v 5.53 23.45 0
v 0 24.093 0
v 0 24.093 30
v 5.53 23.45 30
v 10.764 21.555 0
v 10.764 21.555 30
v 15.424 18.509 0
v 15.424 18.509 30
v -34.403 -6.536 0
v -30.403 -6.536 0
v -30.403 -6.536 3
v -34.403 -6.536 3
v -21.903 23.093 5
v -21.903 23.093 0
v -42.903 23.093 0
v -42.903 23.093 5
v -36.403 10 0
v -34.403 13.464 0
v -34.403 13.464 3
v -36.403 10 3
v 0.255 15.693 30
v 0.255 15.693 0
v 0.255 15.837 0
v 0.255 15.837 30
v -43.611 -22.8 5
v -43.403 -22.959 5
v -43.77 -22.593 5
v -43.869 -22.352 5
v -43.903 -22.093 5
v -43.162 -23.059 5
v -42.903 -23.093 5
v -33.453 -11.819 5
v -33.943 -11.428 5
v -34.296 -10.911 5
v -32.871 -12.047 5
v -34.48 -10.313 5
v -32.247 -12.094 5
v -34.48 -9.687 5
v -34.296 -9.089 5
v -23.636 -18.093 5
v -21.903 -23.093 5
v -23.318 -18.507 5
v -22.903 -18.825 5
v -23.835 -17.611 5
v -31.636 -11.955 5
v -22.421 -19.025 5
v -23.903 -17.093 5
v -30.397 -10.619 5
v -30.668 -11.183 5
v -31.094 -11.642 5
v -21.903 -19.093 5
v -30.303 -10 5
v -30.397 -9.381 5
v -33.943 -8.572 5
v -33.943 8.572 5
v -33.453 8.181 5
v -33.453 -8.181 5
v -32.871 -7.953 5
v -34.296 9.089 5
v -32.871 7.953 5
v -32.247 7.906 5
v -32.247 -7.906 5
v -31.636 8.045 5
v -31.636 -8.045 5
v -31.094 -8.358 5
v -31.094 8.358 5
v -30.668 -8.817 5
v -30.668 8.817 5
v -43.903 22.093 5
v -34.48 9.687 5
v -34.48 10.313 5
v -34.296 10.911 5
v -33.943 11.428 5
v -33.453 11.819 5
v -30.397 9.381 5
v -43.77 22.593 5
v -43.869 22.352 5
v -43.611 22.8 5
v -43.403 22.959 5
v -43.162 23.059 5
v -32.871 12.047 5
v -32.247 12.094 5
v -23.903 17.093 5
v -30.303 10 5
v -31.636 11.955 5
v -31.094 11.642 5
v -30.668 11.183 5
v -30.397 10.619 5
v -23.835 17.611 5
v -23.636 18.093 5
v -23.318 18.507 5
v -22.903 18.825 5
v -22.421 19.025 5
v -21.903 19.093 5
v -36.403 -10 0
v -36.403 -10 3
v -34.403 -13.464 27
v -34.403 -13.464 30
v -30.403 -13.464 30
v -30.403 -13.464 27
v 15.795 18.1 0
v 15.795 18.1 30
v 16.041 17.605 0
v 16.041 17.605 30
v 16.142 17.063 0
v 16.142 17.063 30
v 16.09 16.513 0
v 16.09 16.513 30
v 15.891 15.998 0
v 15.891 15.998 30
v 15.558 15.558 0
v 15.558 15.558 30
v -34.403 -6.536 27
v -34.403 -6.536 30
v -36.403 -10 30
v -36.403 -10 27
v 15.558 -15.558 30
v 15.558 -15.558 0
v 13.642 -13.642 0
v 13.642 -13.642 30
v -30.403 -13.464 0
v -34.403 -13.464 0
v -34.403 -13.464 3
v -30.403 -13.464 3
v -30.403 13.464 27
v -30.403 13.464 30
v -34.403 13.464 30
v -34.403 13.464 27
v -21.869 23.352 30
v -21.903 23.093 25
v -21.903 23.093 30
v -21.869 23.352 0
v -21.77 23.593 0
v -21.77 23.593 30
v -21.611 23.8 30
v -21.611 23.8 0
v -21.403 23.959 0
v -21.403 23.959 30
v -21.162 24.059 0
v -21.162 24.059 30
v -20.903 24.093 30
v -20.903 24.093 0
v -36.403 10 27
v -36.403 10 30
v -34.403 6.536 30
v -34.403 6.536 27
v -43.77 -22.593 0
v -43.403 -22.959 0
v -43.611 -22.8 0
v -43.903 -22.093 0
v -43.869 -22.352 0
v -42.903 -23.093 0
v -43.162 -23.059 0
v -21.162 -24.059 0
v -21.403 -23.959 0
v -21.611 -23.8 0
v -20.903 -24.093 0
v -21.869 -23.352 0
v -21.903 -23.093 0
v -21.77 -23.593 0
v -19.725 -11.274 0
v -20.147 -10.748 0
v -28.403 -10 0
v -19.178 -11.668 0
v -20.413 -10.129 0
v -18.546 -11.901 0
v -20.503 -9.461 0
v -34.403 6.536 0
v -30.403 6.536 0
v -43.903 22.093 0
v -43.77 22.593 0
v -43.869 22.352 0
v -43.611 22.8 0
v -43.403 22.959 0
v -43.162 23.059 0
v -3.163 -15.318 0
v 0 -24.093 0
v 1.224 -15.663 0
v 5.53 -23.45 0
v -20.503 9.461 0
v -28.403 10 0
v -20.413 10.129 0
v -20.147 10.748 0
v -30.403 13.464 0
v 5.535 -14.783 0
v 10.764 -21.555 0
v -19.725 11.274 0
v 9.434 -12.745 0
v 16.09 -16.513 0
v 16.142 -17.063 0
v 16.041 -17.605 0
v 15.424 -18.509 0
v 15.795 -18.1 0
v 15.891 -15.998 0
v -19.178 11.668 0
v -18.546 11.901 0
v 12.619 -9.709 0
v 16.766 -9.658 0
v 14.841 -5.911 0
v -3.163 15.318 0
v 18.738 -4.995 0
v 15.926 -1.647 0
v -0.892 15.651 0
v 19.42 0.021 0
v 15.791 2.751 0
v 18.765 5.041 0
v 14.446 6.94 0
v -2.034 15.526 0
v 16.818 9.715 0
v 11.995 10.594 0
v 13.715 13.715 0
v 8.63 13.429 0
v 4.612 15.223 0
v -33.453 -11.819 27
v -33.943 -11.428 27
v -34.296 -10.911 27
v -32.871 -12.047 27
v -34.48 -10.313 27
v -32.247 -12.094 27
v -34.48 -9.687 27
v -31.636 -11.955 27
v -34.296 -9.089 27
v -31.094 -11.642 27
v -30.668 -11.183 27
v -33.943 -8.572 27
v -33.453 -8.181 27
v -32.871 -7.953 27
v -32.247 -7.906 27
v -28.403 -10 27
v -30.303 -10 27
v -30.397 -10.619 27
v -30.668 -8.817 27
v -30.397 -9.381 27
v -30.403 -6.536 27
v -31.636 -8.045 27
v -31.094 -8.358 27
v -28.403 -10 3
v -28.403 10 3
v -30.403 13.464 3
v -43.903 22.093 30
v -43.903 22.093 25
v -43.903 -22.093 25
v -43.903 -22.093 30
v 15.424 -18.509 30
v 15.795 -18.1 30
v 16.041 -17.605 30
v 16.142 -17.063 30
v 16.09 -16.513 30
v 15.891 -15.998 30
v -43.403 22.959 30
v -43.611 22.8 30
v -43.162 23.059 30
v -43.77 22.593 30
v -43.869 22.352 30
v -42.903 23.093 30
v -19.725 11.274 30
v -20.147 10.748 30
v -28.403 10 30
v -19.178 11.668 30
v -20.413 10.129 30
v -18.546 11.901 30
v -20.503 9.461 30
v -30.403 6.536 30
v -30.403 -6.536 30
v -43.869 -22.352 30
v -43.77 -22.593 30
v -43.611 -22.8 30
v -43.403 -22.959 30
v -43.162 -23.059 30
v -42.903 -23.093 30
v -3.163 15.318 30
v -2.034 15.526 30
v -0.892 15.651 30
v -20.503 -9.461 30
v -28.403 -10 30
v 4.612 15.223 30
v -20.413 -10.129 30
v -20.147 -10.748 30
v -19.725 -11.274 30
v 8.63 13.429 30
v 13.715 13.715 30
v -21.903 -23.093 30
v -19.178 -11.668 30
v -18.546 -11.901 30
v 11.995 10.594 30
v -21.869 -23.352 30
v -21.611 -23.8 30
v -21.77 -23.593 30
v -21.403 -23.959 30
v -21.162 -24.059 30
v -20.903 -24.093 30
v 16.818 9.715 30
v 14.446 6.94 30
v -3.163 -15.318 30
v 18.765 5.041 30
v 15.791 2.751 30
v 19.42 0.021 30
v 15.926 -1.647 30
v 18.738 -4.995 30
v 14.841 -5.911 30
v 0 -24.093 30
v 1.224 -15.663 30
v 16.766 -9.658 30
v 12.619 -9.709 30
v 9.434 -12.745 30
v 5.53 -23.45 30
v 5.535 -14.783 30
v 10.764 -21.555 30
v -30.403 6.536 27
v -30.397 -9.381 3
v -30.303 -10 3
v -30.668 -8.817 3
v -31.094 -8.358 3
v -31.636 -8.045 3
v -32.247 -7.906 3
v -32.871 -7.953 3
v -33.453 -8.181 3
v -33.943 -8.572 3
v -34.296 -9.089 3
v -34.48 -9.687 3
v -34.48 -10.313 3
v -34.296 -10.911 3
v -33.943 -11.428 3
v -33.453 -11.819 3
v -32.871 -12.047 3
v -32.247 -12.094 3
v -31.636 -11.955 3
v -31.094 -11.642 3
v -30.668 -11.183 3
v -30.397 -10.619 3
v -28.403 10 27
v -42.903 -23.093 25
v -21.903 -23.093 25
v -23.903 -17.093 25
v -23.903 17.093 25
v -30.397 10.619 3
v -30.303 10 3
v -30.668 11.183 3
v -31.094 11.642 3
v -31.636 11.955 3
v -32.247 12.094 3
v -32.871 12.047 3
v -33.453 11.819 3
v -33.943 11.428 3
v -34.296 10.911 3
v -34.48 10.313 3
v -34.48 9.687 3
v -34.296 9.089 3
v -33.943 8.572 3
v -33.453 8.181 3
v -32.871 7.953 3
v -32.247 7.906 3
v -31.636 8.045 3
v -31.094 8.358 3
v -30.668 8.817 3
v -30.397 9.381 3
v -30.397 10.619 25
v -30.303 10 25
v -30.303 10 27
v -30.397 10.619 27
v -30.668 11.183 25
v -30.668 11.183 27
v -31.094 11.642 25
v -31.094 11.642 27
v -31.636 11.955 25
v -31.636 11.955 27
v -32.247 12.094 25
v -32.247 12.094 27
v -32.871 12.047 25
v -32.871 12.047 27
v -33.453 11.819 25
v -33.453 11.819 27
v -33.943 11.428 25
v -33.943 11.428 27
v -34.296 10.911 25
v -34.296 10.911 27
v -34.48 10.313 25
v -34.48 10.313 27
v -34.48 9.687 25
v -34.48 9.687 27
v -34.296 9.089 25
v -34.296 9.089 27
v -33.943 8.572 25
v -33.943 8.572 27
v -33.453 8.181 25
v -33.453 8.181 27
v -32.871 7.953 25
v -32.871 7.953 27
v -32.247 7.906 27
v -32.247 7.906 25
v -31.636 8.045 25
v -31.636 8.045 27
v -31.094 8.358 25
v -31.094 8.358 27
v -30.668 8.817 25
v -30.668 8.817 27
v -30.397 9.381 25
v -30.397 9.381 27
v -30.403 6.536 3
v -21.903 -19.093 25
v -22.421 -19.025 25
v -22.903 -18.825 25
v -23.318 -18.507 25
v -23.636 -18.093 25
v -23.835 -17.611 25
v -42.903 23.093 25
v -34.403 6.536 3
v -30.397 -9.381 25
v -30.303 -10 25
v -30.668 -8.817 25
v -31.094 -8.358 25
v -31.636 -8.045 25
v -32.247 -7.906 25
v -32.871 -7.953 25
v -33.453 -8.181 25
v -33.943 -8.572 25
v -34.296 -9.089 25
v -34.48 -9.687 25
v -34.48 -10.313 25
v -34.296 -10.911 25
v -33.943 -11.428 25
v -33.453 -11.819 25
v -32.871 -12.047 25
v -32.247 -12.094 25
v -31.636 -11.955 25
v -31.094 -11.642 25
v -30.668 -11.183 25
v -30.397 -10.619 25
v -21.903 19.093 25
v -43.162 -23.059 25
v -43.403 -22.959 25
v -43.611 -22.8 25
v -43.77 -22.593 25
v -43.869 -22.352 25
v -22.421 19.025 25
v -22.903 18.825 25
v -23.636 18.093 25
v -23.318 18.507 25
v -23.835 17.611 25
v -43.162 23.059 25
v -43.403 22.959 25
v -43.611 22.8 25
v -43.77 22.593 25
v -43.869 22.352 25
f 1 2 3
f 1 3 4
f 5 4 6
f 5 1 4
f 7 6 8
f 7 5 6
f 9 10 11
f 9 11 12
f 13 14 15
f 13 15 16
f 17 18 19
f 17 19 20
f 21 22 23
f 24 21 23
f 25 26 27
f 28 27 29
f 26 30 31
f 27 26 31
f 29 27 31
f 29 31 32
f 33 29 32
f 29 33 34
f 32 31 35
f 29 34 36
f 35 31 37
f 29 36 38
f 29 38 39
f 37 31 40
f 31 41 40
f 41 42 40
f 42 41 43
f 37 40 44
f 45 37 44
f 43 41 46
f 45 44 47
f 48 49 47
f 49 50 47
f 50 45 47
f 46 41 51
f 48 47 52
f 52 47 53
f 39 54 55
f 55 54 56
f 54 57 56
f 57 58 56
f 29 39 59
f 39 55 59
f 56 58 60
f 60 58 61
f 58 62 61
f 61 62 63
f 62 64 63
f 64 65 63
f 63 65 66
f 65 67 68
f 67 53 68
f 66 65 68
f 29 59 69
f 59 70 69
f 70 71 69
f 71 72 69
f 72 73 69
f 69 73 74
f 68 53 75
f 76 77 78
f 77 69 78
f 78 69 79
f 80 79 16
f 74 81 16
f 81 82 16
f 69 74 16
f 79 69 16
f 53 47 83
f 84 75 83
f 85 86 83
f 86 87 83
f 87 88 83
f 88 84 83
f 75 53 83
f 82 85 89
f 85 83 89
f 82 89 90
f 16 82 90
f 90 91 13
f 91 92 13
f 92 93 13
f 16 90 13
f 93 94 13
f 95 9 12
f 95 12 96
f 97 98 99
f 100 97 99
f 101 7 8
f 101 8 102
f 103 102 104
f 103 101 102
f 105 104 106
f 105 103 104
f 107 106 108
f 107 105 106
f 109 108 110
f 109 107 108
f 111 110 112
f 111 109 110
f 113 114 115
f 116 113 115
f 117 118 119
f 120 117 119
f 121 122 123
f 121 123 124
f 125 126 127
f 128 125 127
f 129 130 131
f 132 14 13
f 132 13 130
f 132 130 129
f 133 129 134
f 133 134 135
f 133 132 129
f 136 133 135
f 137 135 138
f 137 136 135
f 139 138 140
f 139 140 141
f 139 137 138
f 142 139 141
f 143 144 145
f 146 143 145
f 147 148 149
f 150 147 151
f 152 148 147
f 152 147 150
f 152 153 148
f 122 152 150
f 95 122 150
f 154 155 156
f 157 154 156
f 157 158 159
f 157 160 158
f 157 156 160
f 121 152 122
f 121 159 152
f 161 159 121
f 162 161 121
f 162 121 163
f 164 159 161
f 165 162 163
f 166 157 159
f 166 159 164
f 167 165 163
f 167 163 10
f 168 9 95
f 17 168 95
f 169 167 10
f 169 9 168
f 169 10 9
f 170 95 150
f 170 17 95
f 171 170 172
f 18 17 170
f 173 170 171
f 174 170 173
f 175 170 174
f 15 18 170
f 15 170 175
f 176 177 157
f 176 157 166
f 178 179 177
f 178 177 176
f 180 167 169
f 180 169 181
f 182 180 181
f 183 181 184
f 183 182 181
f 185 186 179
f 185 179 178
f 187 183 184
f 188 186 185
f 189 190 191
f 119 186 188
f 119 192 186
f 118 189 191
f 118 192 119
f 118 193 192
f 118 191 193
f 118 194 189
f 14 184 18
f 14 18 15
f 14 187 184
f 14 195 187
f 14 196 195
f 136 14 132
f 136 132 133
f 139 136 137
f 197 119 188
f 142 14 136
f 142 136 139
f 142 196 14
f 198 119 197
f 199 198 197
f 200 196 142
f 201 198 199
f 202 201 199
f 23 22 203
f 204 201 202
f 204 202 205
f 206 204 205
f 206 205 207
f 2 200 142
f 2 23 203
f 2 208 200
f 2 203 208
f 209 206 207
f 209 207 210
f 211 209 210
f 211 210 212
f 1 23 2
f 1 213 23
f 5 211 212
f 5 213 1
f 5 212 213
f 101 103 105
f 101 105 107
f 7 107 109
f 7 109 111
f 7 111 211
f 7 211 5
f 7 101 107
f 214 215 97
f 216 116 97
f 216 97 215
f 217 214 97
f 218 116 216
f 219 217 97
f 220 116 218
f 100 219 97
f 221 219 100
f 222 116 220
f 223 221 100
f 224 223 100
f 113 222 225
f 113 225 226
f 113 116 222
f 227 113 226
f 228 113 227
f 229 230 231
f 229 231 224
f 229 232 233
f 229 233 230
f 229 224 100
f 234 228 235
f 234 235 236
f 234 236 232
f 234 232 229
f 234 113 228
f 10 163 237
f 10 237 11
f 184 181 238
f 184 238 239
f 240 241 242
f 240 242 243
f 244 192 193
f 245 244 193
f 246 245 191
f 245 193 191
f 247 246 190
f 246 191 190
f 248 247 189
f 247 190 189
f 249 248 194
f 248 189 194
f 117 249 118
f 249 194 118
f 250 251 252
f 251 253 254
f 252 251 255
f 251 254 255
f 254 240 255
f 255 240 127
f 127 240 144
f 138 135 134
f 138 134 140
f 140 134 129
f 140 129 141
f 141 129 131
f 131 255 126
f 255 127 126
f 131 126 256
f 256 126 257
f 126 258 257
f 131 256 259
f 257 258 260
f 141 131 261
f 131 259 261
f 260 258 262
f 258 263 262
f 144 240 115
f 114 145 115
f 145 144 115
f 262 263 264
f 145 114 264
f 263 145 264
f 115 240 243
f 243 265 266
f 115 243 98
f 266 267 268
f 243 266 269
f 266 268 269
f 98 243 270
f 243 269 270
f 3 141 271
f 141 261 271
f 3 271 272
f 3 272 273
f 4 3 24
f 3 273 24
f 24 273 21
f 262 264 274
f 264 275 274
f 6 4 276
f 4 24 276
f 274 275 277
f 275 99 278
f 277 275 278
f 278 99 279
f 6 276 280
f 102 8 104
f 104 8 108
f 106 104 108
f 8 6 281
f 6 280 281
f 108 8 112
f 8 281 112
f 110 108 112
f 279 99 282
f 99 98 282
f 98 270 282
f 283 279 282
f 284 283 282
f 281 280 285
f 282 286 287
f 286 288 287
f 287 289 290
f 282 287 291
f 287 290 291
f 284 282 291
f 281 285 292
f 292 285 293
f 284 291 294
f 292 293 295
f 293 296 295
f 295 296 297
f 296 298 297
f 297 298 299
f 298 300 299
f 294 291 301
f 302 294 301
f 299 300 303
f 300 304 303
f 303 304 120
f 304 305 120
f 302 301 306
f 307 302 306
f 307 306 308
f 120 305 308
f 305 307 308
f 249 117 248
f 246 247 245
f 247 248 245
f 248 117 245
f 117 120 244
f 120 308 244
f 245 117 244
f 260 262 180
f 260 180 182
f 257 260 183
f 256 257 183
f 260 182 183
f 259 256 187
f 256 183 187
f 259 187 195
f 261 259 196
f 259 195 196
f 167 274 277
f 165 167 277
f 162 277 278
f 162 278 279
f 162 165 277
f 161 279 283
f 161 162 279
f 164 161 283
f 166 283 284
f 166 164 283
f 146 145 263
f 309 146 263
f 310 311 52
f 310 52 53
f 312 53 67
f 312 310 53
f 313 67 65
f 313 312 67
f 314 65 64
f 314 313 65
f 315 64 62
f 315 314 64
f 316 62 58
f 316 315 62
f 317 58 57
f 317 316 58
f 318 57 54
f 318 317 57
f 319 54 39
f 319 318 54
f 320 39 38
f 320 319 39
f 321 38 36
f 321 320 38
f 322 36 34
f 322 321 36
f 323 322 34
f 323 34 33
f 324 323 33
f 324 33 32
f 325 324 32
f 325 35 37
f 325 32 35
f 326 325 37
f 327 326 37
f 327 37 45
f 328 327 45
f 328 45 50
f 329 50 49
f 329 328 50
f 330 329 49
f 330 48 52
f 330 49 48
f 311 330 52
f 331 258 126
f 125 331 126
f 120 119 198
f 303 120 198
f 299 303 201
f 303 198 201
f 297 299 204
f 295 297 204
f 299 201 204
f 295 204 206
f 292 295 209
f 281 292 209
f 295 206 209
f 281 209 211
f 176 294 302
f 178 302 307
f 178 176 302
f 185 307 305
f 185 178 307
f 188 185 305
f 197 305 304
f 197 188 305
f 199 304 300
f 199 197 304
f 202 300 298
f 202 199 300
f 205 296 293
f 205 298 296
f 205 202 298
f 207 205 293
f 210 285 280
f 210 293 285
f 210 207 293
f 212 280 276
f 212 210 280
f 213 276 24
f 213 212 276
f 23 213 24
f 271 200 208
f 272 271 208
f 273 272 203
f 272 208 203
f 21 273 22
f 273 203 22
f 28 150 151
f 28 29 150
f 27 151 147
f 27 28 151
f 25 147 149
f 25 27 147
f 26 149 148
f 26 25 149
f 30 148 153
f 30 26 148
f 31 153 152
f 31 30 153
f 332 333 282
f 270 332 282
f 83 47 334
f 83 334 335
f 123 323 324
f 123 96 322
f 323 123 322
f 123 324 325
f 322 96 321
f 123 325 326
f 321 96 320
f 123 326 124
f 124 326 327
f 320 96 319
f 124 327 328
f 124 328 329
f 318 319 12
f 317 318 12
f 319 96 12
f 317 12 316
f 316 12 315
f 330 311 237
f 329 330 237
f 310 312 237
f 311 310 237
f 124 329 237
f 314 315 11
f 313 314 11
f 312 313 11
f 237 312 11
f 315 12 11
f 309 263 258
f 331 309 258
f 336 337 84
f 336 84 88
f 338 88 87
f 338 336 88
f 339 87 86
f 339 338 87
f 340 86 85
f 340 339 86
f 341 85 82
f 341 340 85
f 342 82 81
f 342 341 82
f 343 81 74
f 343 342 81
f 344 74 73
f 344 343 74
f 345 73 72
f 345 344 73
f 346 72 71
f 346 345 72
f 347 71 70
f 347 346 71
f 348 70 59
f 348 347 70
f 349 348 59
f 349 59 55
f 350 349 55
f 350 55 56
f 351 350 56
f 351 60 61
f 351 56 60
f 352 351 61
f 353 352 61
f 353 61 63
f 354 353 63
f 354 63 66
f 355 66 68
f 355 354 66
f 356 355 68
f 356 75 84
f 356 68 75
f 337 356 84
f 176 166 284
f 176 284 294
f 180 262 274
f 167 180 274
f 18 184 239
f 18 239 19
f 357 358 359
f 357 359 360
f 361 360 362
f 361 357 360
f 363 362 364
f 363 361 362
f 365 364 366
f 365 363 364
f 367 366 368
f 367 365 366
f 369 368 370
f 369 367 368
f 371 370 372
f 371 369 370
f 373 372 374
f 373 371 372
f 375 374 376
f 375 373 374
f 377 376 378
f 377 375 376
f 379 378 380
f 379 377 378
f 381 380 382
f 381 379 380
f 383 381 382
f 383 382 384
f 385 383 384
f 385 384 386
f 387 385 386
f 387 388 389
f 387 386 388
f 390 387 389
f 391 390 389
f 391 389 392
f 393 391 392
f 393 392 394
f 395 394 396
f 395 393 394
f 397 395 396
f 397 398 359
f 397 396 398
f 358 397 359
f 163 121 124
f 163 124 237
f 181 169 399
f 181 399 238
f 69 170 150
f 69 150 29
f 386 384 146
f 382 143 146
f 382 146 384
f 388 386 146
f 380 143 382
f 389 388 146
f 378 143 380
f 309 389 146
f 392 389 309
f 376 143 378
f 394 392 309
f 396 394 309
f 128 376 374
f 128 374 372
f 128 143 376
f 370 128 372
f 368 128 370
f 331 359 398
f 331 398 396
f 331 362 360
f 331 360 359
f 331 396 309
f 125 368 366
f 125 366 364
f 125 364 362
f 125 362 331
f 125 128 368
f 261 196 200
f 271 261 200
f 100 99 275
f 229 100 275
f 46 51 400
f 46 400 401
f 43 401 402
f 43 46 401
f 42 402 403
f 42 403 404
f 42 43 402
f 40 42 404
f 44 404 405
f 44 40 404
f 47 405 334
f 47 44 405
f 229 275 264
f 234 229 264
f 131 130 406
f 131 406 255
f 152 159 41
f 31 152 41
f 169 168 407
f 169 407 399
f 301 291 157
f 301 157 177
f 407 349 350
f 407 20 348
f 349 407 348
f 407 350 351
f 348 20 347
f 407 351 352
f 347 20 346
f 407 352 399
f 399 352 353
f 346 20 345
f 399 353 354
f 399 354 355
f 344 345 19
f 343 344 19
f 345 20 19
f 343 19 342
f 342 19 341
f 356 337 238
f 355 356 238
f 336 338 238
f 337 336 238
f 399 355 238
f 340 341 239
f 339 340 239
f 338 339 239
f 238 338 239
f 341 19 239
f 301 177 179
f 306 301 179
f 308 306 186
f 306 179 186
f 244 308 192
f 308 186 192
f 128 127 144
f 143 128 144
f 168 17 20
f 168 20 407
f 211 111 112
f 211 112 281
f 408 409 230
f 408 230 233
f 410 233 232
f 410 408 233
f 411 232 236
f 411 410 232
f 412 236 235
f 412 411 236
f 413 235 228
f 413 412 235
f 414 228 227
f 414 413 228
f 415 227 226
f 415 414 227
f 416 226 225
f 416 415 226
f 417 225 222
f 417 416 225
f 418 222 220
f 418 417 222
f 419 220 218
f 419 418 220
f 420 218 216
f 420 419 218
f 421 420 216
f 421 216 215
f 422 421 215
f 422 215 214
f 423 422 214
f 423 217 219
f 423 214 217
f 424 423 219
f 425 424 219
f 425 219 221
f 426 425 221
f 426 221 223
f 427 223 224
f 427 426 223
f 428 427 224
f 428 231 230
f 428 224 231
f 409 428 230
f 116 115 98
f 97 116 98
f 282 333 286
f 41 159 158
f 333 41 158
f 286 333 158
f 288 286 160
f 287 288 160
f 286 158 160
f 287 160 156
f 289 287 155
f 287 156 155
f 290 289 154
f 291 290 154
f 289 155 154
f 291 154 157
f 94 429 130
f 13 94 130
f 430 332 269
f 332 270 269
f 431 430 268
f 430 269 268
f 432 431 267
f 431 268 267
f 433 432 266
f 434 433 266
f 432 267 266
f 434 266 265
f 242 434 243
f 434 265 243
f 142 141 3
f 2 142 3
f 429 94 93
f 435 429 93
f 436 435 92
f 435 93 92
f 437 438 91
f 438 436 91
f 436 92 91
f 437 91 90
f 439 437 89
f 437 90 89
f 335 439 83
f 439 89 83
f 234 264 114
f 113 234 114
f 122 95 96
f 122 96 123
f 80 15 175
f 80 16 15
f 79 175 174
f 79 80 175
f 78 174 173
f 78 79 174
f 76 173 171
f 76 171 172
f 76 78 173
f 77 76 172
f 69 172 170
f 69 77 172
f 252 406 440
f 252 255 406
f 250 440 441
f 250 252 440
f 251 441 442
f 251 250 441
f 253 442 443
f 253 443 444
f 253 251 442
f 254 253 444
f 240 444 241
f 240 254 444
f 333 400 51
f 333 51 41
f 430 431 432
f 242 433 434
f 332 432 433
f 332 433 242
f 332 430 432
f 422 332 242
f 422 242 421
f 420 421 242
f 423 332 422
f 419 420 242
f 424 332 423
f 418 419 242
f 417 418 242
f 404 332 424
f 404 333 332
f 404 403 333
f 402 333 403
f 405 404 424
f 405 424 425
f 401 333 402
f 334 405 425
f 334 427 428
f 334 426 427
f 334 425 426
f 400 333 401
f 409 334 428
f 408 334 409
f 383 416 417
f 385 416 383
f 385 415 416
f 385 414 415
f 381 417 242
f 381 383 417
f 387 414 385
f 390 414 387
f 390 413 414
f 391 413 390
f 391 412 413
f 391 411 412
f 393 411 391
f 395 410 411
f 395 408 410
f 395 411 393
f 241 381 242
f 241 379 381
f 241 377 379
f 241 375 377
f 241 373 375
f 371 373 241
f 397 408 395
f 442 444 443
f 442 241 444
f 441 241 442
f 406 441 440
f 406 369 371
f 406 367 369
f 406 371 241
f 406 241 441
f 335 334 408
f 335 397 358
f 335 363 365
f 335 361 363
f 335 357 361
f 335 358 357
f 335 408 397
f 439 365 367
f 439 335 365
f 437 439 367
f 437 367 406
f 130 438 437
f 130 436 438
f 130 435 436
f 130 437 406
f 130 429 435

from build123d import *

# Parameters (mm, degrees)
EXTRUDE_1_DEPTH          = 30
EXTRUDE_START            = -30
EXTRUDE_2_DEPTH          = 30
EXTRUDE_3_DEPTH          = 30
EXTRUDE_START_2          = -2
SKETCH_9_W               = 5
SKETCH_9_H               = 46.18577558
EXTRUDE_6_DEPTH          = 22
FILLET_3_R               = 1
CUT_EXTRUDE_4_DEPTH      = 59.377928803
CUT_EXTRUDE_4_DEPTH_BACK = 59.377928803
SKETCH_10_R              = 2.1
CUT_EXTRUDE_5_DEPTH      = 3


with BuildPart() as part:
    # 草图1 → 凸台-拉伸1 (new body)
    with BuildSketch(Plane.XY):
        with BuildLine():
            Line((-23.903477417, 9.605041416), (-23.903477417, -9.460776308))
            ThreePointArc((-23.903477417, -9.460776308), (-22.605516257, -13.152827027), (-19.282718599, -15.22042404))
            Line((-19.282718599, -15.22042404), (-3.900036331, -18.636980321))
            ThreePointArc((-3.900036331, -18.636980321), (19.420354058, 0.072132554), (-3.900036331, 18.78124543))
            Line((-3.900036331, 18.78124543), (-19.282718599, 15.364689149))
            ThreePointArc((-19.282718599, 15.364689149), (-22.605516257, 13.297092136), (-23.903477417, 9.605041416))
        make_face()
        with BuildLine():
            ThreePointArc((-20.503477417, -9.460776308), (-19.953493875, -11.025204579), (-18.545528765, -11.901305008))
            Line((-18.545528765, -11.901305008), (-3.162846498, -15.317861289))
            ThreePointArc((-3.162846498, -15.317861289), (16.020354058, 0.072132554), (-3.162846498, 15.462126398))
            Line((-3.162846498, 15.462126398), (-18.545528765, 12.045570117))
            ThreePointArc((-18.545528765, 12.045570117), (-19.953493875, 11.169469687), (-20.503477417, 9.605041416))
            Line((-20.503477417, 9.605041416), (-20.503477417, -9.460776308))
        make_face(mode=Mode.SUBTRACT)
    extrude(amount=EXTRUDE_1_DEPTH)

    # 草图2 → 凸台-拉伸2 (add)
    with BuildSketch(Plane.XY.offset(30).offset(EXTRUDE_START)):
        with BuildLine():
            Line((0.255333714, -19.09288779), (-21.903477417, -19.09288779))
            ThreePointArc((-21.903477417, -19.09288779), (-23.31769098, -18.507101352), (-23.903477417, -17.09288779))
            Line((-23.903477417, -17.09288779), (-23.903477417, -9.460776308))
            Line((-23.903477417, -9.460776308), (-20.503477417, -9.460776308))
            ThreePointArc((-20.503477417, -9.460776308), (-19.953493875, -11.025204579), (-18.545528765, -11.901305008))
            Line((-18.545528765, -11.901305008), (-3.162846498, -15.317861289))
            ThreePointArc((-3.162846498, -15.317861289), (-1.464012153, -15.598850703), (0.255333714, -15.69288779))
            Line((0.255333714, -15.69288779), (0.255333714, -19.09288779))
        make_face()
    extrude_2 = extrude(amount=EXTRUDE_2_DEPTH)

    # 草图3 → 凸台-拉伸3 (add)
    with BuildSketch(Plane(origin=(0, 0, 0), x_dir=(-1, 0, 0), z_dir=(0, 0, -1))):
        with BuildLine():
            Line((21.903477417, -19.09288779), (21.903477417, -23.09288779))
            ThreePointArc((21.903477417, -23.09288779), (21.610584198, -23.799994571), (20.903477417, -24.09288779))
            Line((20.903477417, -24.09288779), (0, -24.09288779))
            ThreePointArc((0, -24.09288779), (-8.201928623, -22.653821067), (-15.42405585, -18.508531632))
            ThreePointArc((-15.42405585, -18.508531632), (-16.141619311, -17.062720423), (-15.557886921, -15.557886921))
            Line((-15.557886921, -15.557886921), (-13.642327271, -13.642327271))
            ThreePointArc((-13.642327271, -13.642327271), (-7.482369871, -17.678021056), (-0.255333714, -19.09288779))
            Line((-0.255333714, -19.09288779), (21.903477417, -19.09288779))
        make_face()
    extrude_3 = extrude(amount=-EXTRUDE_3_DEPTH)

    # 镜向1: 凸台-拉伸2, 凸台-拉伸3 across plane
    add(extrude_2.mirror(Plane.ZX))
    add(extrude_3.mirror(Plane.ZX))

    # 草图9 → 凸台-拉伸6 (add)
    with BuildSketch(Plane.ZY.offset(23.903477417).offset(EXTRUDE_START_2)):
        with Locations((2.5, 0)):
            Rectangle(SKETCH_9_W, SKETCH_9_H)
        with Locations((27.5, 0)):
            Rectangle(SKETCH_9_W, SKETCH_9_H)
    extrude(amount=EXTRUDE_6_DEPTH)

    # 圆角3
    fillet_3_edges = [part.edges().sort_by_distance(p)[0] for p in [
        (-43.903477417, 23.09288779, 27.5),
        (-43.903477417, -23.09288779, 27.5),
        (-43.903477417, 23.09288779, 2.5),
        (-43.903477417, -23.09288779, 2.5),
    ]]
    fillet(fillet_3_edges, radius=FILLET_3_R)

    # 草图10 → 切除-拉伸4 (cut, two sides: drawn at the far end of the back side and taken through both)
    with BuildSketch(Plane.XY.offset(30).offset(-CUT_EXTRUDE_4_DEPTH_BACK)):
        with Locations((-32.403477417, 10)):
            Circle(SKETCH_10_R)
        with Locations((-32.403477417, -10)):
            Circle(SKETCH_10_R)
    extrude(amount=CUT_EXTRUDE_4_DEPTH + CUT_EXTRUDE_4_DEPTH_BACK, mode=Mode.SUBTRACT)

    # 草图11 → 切除-拉伸5 (cut)
    with BuildSketch(Plane.XY.offset(30)):
        Polygon((-28.403477417, -10), (-30.403477417, -6.535898385), (-34.403477417, -6.535898385), (-36.403477417, -10), (-34.403477417, -13.464101615), (-30.403477417, -13.464101615), align=None)
        Polygon((-28.403477417, 10), (-30.403477417, 13.464101615), (-34.403477417, 13.464101615), (-36.403477417, 10), (-34.403477417, 6.535898385), (-30.403477417, 6.535898385), align=None)
    cut_extrude_5 = extrude(amount=-CUT_EXTRUDE_5_DEPTH, mode=Mode.SUBTRACT)

    # 镜向3: 切除-拉伸5 across plane
    add(cut_extrude_5.mirror(Plane.XY.offset(15)), mode=Mode.SUBTRACT)


solid = part.part
